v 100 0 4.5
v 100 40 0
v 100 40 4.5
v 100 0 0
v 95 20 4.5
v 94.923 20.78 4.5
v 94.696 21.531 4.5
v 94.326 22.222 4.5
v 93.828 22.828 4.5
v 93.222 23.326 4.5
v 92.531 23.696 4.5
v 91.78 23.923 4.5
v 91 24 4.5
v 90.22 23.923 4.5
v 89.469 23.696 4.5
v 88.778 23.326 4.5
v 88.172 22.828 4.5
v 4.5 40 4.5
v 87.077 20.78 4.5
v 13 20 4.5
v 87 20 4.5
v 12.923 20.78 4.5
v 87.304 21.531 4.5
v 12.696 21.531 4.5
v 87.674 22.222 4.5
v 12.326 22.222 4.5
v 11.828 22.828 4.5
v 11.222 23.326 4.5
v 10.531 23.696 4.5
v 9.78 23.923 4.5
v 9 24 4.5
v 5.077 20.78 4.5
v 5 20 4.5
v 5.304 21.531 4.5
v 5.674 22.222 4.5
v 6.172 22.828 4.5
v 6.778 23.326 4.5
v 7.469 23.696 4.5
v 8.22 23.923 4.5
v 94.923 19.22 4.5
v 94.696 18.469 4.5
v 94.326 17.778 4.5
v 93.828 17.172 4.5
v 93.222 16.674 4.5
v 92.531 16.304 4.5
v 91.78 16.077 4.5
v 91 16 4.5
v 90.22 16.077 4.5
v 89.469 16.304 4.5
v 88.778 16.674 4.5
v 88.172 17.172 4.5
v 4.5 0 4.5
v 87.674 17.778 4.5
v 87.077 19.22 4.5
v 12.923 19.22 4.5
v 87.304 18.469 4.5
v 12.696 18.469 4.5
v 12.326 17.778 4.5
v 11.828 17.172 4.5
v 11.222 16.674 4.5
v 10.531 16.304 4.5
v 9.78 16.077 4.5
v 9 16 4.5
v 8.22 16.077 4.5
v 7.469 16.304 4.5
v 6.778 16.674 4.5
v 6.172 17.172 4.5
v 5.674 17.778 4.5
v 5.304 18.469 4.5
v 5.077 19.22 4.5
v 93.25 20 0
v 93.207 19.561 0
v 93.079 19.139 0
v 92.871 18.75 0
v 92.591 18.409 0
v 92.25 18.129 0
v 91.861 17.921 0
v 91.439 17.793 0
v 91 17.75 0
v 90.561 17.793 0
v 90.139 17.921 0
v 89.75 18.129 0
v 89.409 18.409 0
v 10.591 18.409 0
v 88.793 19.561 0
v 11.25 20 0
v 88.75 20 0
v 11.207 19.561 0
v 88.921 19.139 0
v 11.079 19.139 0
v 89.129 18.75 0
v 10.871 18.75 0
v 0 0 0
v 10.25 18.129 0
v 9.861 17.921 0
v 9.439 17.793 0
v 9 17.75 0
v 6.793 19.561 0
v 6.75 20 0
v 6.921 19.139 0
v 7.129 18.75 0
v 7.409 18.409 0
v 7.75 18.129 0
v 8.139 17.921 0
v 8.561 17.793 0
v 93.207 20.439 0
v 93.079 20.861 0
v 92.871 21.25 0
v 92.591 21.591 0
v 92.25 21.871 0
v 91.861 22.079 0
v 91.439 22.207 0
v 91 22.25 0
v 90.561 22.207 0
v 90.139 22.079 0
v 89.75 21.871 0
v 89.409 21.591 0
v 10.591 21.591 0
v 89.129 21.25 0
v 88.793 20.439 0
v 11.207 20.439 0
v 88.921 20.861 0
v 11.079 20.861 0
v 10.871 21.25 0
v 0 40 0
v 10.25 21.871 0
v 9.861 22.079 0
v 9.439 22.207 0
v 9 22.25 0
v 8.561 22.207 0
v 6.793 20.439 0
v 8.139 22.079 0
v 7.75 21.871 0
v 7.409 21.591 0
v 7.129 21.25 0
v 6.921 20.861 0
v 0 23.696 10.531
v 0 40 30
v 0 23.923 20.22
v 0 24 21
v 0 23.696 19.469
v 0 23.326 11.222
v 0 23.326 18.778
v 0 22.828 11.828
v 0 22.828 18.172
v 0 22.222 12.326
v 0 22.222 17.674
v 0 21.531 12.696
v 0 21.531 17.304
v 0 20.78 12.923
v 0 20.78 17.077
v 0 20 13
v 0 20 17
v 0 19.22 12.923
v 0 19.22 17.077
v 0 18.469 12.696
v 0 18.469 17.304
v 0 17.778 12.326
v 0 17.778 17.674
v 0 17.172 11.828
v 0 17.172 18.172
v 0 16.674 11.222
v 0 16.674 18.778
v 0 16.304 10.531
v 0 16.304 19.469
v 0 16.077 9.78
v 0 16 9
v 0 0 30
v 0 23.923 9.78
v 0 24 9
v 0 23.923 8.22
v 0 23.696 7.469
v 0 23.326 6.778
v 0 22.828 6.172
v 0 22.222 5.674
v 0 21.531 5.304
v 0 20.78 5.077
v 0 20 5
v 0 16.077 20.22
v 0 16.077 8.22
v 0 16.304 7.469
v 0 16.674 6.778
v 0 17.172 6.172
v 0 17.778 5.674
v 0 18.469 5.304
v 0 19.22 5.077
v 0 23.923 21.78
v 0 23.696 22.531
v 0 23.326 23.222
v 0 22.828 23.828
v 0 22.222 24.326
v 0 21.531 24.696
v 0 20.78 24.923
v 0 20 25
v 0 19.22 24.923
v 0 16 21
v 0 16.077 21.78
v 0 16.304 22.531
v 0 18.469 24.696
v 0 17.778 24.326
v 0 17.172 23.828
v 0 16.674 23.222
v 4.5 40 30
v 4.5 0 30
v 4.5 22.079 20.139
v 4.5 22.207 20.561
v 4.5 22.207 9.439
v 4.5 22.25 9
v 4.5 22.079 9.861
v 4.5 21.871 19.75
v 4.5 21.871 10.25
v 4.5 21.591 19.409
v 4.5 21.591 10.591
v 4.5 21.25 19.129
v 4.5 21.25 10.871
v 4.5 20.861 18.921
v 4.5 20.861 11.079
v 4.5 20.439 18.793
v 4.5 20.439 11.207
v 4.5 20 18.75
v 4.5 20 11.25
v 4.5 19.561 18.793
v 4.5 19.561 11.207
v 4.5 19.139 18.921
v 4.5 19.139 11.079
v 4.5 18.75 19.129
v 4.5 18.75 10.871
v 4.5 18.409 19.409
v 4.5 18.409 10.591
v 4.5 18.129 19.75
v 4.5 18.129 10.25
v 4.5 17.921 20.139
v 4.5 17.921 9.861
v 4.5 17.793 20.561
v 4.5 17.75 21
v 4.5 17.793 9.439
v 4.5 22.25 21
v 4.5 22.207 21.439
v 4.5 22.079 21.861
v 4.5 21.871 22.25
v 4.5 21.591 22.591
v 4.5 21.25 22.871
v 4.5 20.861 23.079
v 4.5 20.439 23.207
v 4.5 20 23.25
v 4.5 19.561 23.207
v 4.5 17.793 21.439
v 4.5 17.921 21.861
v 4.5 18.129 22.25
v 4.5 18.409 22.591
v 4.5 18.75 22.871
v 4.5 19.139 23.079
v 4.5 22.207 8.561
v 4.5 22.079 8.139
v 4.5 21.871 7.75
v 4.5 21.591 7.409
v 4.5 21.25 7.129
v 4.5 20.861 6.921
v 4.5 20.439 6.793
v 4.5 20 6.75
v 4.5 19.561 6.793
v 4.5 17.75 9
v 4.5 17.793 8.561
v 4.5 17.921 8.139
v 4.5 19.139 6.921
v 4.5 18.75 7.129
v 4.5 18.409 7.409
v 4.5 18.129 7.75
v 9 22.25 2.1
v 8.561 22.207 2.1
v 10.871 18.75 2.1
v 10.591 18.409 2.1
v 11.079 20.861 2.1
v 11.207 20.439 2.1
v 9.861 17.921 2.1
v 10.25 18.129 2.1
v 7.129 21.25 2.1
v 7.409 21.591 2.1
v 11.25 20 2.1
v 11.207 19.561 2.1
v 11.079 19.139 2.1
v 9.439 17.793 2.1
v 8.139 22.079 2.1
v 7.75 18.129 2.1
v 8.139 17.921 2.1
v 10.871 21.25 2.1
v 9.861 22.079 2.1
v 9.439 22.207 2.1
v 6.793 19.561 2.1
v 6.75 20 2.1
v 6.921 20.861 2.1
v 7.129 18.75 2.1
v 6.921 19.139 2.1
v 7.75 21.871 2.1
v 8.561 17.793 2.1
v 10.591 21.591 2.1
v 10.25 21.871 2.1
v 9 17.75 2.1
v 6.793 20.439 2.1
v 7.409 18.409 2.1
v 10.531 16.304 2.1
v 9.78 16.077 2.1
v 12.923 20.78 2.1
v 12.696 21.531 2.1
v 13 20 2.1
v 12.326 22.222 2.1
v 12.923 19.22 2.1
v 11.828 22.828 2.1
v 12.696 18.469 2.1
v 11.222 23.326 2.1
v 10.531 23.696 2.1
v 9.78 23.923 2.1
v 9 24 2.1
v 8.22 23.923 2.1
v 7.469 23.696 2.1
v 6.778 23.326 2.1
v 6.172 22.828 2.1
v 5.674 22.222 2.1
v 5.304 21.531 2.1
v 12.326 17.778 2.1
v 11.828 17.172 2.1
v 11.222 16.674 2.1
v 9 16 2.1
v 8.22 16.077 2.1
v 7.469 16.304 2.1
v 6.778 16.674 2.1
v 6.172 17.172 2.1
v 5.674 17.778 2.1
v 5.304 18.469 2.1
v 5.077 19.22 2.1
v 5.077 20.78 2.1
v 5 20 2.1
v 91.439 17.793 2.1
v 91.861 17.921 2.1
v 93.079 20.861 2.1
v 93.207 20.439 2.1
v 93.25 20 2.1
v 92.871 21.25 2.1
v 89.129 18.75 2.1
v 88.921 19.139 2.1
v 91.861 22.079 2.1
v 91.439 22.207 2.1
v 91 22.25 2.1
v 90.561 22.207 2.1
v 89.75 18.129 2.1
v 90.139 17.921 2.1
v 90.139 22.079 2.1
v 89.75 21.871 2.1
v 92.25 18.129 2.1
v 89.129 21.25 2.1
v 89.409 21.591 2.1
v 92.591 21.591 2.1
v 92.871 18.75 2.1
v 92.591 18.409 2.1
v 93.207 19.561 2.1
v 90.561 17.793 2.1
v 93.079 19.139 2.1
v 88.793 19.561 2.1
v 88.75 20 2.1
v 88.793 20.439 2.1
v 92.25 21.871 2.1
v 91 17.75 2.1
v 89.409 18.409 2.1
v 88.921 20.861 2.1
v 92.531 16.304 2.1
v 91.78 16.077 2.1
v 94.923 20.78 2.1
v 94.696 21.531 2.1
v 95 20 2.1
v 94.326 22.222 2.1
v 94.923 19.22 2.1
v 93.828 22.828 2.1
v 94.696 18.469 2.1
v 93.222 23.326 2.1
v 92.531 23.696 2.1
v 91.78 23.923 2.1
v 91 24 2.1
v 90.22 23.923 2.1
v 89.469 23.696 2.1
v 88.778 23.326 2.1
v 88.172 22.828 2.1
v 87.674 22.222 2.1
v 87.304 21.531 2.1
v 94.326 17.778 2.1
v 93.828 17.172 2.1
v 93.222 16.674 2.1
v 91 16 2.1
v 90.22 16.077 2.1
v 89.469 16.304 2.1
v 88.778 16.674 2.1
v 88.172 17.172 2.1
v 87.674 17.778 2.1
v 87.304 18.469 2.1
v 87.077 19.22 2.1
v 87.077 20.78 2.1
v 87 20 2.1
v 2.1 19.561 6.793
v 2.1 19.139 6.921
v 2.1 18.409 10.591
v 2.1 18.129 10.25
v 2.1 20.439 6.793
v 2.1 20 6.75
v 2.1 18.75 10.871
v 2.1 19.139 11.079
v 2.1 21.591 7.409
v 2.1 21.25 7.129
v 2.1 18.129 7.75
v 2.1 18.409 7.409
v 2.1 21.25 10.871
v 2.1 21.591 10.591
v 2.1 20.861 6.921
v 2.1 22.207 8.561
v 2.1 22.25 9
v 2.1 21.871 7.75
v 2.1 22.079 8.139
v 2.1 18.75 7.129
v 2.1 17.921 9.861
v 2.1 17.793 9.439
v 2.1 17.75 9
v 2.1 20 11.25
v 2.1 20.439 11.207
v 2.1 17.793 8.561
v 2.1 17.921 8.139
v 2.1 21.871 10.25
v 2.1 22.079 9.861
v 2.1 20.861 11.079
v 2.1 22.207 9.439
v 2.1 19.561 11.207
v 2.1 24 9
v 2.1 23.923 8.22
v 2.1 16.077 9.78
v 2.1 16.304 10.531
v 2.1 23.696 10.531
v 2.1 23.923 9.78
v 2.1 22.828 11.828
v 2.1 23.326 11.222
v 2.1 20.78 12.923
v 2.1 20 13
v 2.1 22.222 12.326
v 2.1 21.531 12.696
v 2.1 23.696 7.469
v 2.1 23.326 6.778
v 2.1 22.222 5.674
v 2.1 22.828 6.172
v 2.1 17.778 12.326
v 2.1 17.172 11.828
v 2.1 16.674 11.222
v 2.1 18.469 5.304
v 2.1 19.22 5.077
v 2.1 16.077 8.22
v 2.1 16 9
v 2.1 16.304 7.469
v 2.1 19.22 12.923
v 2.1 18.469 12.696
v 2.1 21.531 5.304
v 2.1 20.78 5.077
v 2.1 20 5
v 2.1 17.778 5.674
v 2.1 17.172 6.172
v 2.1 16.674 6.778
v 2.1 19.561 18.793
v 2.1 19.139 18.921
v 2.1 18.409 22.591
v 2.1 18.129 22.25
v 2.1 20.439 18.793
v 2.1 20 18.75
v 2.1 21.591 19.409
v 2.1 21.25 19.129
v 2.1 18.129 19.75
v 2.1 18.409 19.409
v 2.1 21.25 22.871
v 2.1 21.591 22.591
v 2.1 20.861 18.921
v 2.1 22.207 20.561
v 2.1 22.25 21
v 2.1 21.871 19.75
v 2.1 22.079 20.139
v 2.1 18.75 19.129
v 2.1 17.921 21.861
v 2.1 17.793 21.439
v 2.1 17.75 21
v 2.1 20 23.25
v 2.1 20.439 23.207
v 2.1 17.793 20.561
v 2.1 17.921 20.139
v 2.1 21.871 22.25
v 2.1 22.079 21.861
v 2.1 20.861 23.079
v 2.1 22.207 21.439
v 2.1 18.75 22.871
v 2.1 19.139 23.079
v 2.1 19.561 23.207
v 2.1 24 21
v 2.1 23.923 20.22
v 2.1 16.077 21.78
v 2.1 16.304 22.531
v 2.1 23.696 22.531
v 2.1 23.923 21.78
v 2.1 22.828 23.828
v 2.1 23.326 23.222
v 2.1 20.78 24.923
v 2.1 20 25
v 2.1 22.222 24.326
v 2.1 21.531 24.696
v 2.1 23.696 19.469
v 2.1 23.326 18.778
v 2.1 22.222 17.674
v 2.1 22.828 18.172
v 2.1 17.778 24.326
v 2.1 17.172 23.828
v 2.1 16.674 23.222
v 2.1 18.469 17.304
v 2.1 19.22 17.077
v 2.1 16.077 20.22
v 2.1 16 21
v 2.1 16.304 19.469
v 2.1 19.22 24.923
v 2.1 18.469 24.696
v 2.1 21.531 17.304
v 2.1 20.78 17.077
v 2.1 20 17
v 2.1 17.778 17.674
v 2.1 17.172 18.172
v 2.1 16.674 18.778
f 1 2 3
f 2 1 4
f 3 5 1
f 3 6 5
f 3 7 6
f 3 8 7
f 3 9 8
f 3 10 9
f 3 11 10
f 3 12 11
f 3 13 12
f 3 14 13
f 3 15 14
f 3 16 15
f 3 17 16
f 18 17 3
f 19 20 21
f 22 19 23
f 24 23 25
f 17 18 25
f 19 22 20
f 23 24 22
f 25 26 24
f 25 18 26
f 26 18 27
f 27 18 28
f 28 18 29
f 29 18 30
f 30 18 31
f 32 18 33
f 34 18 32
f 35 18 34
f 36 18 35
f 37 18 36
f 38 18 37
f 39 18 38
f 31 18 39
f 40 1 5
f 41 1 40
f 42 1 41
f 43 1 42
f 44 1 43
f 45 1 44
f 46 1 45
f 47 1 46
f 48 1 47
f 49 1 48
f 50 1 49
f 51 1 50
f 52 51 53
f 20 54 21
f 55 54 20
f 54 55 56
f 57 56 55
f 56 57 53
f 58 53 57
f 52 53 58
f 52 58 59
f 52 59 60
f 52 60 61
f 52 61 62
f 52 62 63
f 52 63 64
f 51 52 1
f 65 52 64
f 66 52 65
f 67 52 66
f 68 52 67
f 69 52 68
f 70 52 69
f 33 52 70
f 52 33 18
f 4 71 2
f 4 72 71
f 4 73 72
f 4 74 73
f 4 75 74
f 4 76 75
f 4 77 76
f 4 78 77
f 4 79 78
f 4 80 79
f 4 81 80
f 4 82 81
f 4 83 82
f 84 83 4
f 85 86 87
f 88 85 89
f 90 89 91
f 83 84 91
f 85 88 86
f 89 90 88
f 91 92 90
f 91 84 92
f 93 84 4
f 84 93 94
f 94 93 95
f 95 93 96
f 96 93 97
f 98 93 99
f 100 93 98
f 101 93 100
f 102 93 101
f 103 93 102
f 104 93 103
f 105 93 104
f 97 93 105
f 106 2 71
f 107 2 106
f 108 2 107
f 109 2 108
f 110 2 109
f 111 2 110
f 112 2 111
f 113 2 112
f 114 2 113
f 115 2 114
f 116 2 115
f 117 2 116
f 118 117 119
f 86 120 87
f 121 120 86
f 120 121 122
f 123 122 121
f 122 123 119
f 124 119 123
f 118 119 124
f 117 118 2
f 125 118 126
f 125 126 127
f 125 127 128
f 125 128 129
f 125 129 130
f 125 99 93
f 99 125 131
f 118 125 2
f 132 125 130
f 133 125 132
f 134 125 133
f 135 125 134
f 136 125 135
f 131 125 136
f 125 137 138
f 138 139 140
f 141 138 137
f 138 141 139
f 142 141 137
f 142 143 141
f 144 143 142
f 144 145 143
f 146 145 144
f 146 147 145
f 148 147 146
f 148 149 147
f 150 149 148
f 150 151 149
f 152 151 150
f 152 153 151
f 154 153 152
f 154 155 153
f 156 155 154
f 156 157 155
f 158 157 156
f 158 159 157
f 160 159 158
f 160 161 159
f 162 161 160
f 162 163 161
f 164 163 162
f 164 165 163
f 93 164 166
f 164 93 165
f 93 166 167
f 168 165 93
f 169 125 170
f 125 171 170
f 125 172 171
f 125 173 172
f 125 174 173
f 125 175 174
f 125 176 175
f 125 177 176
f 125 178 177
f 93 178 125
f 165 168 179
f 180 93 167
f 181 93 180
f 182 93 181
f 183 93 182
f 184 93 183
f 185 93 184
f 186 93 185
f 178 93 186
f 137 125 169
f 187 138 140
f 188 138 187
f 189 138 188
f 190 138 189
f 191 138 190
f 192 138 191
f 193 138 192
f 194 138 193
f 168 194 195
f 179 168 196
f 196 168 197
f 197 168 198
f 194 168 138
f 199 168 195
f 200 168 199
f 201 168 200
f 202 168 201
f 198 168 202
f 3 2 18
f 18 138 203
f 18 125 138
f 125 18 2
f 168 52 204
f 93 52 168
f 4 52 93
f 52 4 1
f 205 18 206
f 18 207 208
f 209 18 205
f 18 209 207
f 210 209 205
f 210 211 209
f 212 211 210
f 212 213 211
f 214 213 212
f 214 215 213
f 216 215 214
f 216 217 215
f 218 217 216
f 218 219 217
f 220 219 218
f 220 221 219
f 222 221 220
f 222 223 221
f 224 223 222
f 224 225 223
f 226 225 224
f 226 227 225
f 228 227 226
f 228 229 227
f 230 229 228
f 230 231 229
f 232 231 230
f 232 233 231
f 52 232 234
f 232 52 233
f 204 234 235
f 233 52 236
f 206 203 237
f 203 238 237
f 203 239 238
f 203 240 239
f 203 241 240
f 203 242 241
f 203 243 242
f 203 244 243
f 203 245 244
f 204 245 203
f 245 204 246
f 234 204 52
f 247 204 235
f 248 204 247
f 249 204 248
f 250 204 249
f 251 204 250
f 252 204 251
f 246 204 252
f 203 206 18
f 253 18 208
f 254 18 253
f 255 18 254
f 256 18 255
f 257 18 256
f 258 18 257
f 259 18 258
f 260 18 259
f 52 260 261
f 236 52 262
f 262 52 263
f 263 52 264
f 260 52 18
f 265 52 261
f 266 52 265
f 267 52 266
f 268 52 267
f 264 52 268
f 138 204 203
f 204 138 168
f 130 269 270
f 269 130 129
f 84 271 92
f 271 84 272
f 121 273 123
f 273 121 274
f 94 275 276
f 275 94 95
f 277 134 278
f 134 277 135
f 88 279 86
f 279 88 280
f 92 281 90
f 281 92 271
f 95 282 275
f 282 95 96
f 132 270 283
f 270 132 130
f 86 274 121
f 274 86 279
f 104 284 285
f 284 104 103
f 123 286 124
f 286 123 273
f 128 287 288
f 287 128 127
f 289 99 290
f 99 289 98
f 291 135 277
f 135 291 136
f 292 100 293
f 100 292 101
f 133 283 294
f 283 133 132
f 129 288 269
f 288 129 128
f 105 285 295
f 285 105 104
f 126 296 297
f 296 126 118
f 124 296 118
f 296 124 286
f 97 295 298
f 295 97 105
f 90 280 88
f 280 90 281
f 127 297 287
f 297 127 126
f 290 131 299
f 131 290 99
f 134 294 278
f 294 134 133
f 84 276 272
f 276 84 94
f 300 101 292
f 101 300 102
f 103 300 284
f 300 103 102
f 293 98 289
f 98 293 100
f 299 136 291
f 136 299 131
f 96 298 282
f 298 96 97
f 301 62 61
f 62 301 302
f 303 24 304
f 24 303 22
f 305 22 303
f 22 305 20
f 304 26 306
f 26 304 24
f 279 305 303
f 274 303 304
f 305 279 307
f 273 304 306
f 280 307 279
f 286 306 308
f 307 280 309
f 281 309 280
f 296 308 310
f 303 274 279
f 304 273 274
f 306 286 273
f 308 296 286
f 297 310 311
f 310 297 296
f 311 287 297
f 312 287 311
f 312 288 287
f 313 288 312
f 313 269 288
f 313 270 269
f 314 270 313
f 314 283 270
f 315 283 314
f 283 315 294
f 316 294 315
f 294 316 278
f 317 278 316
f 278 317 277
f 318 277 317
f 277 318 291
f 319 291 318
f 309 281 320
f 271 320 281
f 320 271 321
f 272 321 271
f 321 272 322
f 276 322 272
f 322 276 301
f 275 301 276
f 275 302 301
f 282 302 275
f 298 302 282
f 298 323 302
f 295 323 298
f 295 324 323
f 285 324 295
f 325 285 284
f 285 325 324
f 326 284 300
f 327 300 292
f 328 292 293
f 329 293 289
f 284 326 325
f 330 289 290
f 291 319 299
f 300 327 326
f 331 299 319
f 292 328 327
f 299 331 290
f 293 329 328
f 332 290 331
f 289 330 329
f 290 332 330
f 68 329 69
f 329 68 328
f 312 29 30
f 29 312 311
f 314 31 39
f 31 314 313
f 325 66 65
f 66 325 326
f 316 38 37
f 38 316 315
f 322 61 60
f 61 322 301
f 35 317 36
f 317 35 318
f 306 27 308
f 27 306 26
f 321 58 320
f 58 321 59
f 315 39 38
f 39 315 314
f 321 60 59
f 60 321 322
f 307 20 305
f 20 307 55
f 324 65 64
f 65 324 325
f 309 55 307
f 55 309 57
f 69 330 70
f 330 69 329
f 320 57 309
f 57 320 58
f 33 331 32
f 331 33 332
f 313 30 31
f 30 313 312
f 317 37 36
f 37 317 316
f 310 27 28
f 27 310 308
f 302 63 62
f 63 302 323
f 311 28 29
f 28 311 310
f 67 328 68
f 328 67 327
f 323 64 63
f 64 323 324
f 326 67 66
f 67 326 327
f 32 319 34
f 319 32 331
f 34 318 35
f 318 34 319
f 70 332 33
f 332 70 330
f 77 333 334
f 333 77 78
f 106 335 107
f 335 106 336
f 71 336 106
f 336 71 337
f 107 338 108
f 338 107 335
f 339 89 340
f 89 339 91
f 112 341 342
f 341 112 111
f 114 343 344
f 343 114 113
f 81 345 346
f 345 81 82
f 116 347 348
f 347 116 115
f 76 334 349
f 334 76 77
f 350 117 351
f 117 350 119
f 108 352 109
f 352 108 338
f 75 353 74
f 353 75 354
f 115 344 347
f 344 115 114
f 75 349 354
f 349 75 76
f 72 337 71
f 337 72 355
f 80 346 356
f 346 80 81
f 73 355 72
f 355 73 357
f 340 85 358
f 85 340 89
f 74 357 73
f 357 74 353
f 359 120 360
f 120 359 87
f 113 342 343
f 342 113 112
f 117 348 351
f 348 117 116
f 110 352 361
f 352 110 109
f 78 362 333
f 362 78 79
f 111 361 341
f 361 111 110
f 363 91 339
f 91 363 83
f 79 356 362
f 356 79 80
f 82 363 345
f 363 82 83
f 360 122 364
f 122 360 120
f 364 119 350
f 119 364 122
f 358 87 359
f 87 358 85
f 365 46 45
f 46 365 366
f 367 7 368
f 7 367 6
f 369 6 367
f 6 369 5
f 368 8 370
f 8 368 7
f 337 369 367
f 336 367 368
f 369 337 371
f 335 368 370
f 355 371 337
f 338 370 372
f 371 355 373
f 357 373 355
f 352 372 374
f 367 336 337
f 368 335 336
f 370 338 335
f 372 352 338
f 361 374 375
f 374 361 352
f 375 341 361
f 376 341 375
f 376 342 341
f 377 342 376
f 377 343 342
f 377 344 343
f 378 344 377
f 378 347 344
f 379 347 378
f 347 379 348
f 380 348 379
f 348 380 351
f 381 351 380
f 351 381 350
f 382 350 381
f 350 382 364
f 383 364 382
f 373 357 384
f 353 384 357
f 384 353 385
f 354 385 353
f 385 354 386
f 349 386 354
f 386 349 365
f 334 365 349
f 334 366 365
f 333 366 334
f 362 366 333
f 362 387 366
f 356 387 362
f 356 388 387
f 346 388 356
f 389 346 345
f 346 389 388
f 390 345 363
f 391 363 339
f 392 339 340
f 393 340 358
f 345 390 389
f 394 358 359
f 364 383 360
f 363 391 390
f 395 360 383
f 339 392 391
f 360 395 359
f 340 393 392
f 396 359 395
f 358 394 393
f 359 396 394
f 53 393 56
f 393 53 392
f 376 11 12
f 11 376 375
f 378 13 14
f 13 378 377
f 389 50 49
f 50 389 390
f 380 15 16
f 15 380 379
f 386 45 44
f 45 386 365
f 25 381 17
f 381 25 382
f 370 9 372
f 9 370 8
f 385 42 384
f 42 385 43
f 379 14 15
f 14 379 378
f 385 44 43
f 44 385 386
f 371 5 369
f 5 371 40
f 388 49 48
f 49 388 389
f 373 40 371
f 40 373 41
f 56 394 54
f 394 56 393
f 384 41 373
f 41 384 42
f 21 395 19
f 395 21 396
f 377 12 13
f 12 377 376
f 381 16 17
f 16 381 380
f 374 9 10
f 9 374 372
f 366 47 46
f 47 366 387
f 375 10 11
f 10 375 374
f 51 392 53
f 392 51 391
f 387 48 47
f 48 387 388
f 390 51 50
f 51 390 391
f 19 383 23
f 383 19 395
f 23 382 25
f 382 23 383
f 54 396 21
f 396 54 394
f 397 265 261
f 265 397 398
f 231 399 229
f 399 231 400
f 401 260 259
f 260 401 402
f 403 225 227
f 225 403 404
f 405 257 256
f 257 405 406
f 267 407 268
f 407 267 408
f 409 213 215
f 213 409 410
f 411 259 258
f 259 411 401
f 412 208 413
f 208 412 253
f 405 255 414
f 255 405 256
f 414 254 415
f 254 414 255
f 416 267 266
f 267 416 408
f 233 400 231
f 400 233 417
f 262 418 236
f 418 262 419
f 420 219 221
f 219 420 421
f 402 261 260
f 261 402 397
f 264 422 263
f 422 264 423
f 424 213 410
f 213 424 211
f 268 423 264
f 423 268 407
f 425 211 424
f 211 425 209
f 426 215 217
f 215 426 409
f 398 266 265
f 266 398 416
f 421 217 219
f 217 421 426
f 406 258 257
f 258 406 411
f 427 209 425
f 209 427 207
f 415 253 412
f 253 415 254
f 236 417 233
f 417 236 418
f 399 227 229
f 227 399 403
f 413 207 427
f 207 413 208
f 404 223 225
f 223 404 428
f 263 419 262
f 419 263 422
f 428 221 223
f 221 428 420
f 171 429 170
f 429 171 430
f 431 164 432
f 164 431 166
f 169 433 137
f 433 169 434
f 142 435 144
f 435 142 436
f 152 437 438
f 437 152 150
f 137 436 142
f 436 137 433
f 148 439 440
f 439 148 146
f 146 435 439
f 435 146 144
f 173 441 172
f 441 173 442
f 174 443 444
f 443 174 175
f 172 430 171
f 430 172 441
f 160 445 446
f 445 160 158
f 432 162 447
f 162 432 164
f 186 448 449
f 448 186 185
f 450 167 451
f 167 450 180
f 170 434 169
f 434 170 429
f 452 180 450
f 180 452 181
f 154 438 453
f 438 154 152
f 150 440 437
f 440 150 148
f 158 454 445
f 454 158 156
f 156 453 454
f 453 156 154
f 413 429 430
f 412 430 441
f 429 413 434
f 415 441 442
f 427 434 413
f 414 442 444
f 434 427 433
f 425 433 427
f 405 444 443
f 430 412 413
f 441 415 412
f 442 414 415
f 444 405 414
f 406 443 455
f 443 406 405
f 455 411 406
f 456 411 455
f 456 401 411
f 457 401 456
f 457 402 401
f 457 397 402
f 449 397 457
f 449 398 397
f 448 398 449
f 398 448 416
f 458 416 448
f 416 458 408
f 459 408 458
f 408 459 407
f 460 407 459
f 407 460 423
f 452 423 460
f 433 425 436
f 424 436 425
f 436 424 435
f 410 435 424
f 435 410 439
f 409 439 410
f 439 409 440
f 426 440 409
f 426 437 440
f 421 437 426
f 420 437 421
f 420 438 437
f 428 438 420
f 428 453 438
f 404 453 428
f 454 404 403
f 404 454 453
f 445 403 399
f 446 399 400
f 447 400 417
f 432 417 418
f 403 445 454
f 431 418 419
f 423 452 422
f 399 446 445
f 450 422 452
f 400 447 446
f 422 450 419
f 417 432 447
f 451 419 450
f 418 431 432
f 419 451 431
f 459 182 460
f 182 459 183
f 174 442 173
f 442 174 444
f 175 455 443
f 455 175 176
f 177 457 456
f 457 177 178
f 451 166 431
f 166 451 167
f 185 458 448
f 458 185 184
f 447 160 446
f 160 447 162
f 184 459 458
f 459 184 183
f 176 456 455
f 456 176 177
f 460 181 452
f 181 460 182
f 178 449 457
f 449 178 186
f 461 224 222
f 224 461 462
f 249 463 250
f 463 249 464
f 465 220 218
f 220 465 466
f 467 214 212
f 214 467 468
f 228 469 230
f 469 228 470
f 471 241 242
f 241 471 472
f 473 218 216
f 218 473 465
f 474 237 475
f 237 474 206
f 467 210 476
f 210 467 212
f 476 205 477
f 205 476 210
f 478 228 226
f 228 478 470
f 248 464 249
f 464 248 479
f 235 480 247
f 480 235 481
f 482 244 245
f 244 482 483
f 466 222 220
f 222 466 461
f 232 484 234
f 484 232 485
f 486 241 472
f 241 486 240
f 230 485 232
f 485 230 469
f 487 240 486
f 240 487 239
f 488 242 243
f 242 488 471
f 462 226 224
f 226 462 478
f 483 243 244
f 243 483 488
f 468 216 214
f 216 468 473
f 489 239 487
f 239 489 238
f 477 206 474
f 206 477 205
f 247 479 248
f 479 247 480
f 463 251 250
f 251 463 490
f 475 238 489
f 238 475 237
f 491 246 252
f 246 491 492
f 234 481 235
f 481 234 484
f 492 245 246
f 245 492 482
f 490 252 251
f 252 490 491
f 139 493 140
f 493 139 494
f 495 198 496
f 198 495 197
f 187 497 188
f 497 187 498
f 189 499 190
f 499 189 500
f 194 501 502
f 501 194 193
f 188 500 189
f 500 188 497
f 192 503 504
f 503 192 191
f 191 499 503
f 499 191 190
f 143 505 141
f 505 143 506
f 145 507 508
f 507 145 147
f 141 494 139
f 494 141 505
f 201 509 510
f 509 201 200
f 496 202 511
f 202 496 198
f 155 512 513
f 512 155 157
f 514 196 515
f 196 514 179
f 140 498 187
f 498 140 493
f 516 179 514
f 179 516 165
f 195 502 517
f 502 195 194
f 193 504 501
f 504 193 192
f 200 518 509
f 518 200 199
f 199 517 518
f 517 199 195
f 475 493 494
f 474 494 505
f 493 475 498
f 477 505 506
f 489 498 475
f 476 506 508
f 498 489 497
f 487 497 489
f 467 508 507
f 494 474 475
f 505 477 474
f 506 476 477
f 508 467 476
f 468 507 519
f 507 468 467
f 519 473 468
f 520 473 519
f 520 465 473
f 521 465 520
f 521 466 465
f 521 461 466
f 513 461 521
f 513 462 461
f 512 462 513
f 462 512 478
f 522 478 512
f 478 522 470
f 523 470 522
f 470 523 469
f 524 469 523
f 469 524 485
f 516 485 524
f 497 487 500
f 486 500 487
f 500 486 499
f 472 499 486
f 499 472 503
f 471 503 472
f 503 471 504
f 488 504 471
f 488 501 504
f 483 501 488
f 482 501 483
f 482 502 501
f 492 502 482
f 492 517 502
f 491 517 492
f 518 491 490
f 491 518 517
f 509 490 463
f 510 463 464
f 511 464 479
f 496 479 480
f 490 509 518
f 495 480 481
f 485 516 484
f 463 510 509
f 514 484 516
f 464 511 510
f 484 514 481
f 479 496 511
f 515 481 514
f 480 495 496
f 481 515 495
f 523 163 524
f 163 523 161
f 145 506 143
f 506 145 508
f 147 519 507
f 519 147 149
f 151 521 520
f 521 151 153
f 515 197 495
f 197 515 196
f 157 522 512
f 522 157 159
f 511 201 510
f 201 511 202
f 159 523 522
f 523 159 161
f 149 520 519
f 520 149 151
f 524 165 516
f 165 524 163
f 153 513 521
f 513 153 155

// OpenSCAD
$fn = 32;

// ----------------------------------------------------------------------
// L-bracket: 100 x 40 x 30 mm
// ----------------------------------------------------------------------

// --- parameters (mm) ---
run_out = 100;            // horizontal leg, X
rise = 30;                // vertical leg, Z
bracket_w = 40;           // bracket depth, Y
sheet_t = 4.5;            // plate thickness
hole_d = 4.5;             // clearance for M4
cb_d = 8;                 // counterbore seat
cb_h = 2.4;               // counterbore depth

module hole_z(px, py) {
  translate([px, py, -2.5]) cylinder(h = sheet_t + 5, d = hole_d);
}
module hole_x(pz, py) {
  translate([-2.5, py, pz]) rotate([0, 90, 0]) cylinder(h = sheet_t + 5, d = hole_d);
}
module cb_z(px, py) {
  translate([px, py, sheet_t - cb_h]) cylinder(h = cb_h + 0.4, d = cb_d);
}
module cb_x(pz, py) {
  translate([sheet_t - cb_h, py, pz]) rotate([0, -90, 0]) cylinder(h = cb_h + 0.4, d = cb_d);
}

difference() {
  union() {
    /* horizontal leg */
    cube([run_out, bracket_w, sheet_t]);
    /* vertical leg, overlapping the corner block */
    cube([sheet_t, bracket_w, rise]);
  }
  hole_z(9, 20);
  cb_z(9, 20);
  hole_z(91, 20);
  cb_z(91, 20);
  hole_x(9, 20);
  cb_x(9, 20);
  hole_x(21, 20);
  cb_x(21, 20);
}
